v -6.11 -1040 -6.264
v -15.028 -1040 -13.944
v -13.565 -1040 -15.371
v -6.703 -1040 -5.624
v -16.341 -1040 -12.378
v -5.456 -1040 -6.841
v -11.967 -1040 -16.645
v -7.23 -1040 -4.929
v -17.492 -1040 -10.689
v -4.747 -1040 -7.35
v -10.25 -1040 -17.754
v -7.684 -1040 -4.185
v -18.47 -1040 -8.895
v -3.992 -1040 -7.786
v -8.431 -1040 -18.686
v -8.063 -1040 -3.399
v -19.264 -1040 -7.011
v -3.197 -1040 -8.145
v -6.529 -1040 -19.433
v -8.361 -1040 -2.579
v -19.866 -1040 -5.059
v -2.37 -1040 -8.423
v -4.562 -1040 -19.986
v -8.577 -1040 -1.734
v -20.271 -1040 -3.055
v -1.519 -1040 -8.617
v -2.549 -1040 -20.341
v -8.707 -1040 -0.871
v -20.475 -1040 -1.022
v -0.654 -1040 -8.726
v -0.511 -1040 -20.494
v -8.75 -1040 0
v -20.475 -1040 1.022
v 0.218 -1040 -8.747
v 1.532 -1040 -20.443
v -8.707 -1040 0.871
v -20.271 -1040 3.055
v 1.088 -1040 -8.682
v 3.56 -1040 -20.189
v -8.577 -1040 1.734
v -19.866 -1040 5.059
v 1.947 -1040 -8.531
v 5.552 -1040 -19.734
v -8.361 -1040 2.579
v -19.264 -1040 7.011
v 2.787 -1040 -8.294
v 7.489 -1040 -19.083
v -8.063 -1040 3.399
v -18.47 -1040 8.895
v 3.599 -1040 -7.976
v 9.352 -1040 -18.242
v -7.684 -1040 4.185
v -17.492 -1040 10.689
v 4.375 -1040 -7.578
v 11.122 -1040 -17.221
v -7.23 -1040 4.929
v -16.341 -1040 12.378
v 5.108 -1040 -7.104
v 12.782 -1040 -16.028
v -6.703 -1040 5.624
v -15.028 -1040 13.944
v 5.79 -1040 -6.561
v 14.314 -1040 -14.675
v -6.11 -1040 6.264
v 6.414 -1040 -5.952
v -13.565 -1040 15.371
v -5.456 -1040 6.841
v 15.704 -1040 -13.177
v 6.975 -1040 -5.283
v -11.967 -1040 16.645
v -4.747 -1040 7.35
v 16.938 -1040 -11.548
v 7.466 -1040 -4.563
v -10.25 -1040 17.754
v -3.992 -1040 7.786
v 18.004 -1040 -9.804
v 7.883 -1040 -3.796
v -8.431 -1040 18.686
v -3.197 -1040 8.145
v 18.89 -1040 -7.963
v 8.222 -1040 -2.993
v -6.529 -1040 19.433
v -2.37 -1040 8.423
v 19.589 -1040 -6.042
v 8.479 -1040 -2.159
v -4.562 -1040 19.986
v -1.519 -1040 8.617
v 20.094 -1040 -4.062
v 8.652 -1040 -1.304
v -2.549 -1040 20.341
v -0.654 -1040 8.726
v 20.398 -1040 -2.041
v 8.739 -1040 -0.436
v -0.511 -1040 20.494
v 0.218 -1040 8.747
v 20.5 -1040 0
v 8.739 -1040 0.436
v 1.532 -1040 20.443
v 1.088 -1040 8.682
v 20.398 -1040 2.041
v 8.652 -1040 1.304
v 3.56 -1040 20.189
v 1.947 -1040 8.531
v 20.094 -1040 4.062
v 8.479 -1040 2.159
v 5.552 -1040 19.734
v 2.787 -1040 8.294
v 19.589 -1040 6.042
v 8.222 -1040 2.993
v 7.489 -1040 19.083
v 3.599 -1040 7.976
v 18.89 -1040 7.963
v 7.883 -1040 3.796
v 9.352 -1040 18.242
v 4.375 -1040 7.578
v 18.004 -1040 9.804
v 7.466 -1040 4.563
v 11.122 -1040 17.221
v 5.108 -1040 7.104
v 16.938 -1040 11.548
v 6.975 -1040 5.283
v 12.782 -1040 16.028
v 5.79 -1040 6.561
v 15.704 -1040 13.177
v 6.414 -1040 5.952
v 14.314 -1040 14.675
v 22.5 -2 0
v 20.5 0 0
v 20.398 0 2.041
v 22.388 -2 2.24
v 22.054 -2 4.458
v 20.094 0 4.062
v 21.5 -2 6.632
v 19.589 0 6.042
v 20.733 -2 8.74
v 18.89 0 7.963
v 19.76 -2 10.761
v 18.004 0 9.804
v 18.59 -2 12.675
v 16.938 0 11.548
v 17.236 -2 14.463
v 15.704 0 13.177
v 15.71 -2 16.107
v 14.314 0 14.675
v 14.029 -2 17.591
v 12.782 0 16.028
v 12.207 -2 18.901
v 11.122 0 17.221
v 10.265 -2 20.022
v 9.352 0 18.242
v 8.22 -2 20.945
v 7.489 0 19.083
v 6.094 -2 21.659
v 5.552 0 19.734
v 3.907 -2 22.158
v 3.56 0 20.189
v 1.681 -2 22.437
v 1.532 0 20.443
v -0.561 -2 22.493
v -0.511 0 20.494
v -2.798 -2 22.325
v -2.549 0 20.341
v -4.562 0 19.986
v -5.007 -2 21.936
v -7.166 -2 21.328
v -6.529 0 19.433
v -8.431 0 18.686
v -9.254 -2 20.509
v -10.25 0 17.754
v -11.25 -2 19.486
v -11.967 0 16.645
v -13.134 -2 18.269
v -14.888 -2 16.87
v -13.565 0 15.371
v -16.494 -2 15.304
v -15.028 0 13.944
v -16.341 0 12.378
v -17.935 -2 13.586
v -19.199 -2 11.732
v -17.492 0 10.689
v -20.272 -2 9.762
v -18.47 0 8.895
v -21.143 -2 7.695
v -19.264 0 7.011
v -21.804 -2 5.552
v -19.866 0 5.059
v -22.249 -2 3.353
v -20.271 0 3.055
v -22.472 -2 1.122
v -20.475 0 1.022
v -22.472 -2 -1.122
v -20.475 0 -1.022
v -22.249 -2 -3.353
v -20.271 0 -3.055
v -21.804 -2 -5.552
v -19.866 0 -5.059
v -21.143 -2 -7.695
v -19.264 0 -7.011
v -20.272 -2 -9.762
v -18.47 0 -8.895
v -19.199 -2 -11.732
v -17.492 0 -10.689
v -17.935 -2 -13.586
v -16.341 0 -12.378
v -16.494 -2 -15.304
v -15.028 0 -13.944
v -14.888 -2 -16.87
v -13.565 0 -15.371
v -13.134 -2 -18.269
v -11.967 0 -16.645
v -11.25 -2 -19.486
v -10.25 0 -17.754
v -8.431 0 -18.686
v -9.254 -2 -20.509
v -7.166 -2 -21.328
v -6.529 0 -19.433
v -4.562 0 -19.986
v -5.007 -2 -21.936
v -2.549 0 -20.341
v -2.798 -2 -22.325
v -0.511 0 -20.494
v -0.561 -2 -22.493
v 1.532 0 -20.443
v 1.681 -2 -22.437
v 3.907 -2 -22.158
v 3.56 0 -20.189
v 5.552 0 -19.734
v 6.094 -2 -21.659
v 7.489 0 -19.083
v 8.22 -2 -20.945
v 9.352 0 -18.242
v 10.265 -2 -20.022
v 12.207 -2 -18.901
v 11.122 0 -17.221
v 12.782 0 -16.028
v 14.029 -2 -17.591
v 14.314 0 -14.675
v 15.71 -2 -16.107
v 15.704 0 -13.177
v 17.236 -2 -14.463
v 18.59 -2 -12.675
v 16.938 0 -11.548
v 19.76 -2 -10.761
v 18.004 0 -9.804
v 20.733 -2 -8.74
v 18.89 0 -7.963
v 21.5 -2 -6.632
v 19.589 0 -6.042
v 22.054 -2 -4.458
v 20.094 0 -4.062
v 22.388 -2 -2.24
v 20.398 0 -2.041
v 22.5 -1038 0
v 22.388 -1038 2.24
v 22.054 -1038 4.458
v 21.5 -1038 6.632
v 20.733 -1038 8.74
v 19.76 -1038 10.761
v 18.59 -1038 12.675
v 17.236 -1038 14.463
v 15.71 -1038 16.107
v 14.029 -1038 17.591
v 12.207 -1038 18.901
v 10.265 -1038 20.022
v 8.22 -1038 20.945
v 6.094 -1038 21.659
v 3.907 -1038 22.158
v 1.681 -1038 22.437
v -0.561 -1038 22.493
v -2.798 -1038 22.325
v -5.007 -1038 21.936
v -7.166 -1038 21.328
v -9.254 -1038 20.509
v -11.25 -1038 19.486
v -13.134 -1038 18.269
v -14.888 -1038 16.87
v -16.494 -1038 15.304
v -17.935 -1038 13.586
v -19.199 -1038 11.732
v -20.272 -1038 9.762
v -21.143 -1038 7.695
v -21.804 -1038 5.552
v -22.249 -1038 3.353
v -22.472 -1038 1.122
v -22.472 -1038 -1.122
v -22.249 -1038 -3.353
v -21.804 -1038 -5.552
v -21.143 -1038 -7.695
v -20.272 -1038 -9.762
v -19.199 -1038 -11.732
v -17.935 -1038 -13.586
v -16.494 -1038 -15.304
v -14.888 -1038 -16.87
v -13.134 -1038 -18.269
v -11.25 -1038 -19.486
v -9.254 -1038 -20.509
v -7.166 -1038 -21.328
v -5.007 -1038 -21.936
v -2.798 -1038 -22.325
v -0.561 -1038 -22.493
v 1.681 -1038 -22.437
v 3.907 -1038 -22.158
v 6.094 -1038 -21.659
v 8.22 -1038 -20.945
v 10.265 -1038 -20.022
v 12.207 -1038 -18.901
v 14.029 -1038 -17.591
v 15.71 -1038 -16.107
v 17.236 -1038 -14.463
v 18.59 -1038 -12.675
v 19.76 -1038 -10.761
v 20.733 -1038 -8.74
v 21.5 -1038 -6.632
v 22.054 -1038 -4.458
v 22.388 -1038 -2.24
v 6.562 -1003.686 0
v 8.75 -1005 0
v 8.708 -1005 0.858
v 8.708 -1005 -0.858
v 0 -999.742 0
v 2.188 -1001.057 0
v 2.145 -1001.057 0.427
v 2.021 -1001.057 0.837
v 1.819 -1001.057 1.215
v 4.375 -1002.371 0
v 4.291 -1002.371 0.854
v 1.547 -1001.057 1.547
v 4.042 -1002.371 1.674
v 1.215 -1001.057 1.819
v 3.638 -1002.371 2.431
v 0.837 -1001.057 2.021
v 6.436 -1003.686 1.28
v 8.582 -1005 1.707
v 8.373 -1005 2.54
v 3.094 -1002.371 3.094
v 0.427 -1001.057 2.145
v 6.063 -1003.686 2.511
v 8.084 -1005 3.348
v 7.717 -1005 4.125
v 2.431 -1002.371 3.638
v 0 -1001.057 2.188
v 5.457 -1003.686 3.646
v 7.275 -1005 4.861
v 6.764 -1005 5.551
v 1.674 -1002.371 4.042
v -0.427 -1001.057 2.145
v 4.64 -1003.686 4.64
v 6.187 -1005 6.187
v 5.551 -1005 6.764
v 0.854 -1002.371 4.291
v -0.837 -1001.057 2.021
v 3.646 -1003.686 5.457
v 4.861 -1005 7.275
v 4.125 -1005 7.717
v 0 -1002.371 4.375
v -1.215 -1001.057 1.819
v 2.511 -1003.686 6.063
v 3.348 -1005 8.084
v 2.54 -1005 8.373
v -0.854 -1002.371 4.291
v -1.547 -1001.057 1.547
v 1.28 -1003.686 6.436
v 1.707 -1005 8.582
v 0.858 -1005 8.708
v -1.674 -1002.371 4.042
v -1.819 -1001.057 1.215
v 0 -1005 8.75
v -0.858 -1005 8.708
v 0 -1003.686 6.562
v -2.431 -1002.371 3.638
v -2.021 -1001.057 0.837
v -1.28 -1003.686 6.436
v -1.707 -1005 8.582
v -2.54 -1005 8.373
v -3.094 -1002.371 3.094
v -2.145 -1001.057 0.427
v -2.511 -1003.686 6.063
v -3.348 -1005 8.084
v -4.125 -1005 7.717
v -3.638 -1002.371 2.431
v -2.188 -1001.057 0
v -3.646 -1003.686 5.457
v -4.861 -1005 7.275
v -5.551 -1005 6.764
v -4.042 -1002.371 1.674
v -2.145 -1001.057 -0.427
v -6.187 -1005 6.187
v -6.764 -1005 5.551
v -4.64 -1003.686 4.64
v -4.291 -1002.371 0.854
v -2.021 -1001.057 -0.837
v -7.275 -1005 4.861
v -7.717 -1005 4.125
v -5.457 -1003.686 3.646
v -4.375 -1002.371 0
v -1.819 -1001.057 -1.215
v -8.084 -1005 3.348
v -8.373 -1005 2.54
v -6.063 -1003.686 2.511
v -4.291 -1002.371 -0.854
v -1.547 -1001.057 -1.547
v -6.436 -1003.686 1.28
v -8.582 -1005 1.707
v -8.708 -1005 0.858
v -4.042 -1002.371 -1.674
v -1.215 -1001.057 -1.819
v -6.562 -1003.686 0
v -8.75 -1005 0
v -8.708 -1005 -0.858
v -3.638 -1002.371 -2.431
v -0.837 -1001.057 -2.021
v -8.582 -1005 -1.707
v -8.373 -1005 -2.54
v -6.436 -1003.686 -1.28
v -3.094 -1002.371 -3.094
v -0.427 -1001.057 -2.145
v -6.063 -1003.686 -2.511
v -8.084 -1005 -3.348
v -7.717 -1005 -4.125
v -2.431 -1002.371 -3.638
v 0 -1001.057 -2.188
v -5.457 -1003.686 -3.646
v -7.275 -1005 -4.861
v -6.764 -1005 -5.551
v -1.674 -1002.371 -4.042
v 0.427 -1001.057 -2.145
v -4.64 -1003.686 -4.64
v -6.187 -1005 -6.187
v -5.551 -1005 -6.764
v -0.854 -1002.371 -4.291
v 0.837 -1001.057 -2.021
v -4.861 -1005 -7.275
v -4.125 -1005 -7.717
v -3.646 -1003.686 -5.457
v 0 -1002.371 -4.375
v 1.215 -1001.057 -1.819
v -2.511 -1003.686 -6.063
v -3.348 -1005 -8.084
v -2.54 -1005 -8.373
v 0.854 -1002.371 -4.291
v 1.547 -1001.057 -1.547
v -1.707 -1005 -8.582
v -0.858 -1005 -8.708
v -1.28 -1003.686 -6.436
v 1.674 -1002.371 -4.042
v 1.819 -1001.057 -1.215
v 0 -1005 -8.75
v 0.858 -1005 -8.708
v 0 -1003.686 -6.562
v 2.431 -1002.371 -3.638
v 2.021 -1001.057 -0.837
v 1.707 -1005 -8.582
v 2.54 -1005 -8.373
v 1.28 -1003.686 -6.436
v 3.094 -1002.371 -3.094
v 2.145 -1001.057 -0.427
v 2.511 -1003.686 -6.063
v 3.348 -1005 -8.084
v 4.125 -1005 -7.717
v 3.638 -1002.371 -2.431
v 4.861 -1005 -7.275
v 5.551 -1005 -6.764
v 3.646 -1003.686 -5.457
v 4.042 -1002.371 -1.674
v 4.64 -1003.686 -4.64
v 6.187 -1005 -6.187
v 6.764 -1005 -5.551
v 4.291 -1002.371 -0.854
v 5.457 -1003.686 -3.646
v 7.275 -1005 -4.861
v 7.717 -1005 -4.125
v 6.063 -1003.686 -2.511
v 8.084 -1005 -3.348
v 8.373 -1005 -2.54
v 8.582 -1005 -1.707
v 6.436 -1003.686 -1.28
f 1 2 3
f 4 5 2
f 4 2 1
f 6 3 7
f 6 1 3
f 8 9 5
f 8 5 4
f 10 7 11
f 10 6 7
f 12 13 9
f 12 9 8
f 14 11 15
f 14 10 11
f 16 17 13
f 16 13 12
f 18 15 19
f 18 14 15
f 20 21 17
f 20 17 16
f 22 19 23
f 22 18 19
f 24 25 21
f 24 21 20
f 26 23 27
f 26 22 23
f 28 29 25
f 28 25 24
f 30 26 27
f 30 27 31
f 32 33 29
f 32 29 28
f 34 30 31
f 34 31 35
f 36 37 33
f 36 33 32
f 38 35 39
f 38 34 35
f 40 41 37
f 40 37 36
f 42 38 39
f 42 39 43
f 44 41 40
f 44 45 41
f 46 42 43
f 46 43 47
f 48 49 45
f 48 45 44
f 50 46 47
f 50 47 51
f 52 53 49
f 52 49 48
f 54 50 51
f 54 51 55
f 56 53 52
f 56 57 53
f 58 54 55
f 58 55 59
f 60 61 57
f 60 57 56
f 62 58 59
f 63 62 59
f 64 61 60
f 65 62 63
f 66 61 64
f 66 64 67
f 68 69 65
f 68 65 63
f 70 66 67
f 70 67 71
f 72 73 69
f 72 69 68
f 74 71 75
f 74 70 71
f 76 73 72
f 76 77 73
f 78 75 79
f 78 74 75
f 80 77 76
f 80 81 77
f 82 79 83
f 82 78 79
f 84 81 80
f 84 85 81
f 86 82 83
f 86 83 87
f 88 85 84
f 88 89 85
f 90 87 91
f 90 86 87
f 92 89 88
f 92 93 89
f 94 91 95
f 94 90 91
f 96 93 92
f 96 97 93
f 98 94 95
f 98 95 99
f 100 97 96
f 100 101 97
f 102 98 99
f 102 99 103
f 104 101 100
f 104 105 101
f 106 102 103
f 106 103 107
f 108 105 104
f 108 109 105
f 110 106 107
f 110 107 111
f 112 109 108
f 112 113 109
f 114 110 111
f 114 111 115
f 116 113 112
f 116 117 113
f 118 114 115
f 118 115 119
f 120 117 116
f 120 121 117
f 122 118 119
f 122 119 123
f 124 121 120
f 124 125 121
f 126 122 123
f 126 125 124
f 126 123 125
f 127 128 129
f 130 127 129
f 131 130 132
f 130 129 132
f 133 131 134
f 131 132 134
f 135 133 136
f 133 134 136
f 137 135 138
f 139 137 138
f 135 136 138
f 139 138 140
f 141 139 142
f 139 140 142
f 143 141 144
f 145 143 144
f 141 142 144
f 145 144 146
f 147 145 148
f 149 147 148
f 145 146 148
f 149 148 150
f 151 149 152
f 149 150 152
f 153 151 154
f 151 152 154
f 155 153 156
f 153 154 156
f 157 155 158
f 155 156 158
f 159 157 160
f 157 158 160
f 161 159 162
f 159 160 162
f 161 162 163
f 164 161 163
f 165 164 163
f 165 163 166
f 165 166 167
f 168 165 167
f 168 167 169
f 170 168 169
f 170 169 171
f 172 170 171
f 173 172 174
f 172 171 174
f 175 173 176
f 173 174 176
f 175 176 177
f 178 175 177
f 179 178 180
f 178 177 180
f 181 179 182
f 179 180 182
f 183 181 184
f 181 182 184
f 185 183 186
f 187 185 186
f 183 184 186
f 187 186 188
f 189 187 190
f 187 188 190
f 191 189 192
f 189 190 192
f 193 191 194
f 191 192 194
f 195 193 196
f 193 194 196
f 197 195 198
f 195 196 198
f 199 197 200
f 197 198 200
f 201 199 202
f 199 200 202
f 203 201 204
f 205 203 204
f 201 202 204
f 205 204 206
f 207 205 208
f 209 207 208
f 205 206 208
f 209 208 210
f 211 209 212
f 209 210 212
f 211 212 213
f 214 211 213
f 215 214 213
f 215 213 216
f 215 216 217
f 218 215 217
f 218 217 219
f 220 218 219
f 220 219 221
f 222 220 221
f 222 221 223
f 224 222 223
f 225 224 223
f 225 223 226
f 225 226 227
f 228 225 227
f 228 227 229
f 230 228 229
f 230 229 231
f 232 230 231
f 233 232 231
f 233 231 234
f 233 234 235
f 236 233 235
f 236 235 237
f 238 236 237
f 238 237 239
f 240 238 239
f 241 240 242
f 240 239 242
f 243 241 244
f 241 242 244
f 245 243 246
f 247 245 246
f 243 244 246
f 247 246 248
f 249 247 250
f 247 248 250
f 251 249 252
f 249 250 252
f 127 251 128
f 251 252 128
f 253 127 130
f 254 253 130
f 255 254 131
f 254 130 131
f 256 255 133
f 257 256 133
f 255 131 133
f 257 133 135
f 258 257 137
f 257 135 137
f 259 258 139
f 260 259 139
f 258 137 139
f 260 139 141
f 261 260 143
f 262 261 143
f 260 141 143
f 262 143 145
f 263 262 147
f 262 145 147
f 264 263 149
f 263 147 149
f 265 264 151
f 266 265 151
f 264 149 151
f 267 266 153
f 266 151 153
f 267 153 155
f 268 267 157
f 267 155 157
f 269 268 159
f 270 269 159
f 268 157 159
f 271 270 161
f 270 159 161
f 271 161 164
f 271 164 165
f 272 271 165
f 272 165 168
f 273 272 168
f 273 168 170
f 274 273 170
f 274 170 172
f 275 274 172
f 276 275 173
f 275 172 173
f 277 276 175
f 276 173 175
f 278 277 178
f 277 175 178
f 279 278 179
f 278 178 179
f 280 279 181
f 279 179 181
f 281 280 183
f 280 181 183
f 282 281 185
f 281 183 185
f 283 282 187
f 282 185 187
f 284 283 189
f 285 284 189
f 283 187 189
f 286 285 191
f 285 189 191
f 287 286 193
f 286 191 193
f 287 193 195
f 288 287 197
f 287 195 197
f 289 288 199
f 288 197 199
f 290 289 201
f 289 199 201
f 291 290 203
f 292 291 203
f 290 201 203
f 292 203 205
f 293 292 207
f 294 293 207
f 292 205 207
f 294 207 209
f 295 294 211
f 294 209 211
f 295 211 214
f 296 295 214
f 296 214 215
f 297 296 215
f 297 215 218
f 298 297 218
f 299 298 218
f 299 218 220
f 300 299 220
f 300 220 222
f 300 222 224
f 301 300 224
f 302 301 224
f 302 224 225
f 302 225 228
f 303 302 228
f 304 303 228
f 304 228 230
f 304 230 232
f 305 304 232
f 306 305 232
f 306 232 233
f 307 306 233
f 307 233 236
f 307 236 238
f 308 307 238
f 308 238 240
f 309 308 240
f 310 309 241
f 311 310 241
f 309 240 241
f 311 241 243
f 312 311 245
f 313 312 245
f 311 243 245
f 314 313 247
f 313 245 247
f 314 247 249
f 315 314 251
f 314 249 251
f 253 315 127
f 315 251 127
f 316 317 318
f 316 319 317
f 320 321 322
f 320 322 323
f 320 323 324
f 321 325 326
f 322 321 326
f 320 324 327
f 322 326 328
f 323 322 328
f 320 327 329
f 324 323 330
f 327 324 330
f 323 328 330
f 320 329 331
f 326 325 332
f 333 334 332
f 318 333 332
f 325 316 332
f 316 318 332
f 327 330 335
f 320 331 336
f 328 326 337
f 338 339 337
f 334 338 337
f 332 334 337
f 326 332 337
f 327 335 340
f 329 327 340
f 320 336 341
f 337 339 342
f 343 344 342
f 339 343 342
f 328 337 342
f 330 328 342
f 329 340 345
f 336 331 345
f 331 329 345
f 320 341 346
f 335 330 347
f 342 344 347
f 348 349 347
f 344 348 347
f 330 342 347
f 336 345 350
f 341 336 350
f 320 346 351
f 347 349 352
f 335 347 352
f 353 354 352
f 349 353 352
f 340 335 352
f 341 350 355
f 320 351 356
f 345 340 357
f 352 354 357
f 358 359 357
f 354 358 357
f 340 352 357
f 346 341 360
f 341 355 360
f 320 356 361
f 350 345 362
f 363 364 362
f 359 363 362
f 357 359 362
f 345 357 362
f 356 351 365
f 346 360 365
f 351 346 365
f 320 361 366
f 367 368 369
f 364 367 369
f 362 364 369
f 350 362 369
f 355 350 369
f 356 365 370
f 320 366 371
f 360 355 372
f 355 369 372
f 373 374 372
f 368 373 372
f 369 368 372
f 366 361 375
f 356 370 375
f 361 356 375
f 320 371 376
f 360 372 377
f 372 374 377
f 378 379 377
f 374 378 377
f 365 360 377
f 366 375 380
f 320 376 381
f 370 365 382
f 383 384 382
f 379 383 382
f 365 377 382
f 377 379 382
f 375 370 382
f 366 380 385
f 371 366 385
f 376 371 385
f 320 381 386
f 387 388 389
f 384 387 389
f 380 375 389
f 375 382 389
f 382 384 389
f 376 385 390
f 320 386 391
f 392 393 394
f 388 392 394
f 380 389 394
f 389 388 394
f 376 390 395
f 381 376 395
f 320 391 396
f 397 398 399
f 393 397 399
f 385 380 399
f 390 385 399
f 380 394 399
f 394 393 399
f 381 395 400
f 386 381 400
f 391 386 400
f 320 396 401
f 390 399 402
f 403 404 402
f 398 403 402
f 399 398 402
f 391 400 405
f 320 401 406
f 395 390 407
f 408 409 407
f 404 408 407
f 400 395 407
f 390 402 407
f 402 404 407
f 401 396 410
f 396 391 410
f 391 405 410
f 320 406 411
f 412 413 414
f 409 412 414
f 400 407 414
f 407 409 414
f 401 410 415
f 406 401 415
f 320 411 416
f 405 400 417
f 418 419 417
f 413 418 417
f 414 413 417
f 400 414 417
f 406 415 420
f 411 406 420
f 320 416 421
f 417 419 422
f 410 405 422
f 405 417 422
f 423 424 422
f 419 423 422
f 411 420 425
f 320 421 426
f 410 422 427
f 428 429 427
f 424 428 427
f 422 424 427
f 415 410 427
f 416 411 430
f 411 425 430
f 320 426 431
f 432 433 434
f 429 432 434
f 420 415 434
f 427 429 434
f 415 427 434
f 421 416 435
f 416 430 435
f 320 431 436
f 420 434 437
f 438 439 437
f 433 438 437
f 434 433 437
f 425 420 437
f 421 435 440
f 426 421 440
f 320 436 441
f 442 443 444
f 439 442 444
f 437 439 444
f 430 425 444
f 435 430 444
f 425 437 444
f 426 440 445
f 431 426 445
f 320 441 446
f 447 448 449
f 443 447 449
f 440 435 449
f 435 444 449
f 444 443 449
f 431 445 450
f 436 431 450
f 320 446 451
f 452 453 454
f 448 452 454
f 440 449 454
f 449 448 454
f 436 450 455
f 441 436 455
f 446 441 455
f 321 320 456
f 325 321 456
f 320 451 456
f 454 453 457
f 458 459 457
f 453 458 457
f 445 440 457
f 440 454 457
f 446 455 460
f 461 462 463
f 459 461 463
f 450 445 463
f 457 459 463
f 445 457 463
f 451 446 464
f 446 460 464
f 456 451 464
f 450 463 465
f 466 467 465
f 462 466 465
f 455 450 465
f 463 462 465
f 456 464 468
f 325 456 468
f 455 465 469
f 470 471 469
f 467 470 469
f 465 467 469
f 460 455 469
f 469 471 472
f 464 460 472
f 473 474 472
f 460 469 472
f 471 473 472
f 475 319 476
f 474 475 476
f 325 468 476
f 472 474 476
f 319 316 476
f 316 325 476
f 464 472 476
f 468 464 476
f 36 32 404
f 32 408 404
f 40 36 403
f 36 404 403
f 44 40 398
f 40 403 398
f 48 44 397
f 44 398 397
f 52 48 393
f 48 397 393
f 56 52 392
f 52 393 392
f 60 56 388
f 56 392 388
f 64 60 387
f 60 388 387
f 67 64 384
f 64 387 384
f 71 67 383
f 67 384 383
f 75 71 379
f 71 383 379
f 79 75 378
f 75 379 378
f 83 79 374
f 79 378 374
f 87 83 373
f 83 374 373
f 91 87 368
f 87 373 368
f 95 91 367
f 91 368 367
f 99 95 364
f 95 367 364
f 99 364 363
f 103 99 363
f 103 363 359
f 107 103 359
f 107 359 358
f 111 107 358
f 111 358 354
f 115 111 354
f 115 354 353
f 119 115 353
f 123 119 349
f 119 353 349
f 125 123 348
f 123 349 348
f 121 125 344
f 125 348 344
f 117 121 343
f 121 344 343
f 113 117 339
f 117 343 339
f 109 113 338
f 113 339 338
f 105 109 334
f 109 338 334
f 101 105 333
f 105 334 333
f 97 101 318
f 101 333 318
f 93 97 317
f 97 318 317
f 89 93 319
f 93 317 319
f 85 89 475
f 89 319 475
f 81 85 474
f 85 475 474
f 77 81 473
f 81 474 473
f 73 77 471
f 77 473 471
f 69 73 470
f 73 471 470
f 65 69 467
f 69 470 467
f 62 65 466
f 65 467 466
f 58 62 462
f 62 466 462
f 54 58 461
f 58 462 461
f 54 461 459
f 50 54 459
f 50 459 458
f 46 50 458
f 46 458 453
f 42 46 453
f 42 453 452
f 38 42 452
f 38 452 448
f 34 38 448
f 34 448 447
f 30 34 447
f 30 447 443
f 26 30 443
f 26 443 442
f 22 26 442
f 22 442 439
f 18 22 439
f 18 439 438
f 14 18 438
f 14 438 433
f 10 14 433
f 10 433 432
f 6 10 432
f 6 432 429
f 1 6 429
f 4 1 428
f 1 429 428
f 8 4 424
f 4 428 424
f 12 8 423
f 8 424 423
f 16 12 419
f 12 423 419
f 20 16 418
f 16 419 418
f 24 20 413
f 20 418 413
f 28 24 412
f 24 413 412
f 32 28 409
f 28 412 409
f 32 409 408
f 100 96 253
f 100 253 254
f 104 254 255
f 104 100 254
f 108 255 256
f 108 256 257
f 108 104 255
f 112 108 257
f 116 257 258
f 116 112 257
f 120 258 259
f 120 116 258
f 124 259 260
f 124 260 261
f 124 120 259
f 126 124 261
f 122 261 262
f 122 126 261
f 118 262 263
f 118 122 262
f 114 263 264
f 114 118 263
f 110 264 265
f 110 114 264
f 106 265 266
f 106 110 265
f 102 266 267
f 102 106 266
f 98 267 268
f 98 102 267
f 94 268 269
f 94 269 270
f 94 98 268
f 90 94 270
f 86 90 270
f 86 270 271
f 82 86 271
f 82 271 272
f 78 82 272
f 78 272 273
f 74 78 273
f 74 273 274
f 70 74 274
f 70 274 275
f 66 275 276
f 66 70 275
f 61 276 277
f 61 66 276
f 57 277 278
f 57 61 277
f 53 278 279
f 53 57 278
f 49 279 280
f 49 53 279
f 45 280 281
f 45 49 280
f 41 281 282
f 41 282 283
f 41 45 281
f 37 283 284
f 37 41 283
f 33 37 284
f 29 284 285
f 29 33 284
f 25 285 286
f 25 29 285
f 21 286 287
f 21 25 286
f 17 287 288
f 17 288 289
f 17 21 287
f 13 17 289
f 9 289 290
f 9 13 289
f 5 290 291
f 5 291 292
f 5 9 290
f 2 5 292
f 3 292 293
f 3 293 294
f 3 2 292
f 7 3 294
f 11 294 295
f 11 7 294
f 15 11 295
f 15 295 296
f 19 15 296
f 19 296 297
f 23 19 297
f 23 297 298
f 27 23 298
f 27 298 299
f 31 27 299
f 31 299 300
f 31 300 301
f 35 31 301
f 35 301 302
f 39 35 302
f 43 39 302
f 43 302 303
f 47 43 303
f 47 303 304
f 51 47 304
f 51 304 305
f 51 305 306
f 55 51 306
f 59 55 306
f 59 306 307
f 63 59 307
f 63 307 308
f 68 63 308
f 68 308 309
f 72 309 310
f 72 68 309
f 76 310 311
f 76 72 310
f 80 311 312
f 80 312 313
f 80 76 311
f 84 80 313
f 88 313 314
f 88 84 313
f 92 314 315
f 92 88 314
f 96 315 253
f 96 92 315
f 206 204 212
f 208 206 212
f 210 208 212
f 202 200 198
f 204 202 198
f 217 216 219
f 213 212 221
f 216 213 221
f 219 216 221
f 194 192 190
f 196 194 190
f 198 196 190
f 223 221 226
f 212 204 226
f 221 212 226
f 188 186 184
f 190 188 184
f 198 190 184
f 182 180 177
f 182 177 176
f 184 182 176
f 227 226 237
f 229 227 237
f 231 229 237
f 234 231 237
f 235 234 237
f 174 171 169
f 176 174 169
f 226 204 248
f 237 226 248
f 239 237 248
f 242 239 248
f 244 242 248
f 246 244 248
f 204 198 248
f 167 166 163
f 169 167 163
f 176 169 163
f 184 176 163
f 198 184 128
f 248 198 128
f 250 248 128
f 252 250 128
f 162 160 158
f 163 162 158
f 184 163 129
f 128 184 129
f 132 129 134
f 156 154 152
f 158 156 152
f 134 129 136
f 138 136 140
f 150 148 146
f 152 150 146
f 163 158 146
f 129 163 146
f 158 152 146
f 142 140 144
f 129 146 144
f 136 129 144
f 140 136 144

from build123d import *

# Parameters (mm, degrees)
F0_R     = 22.5
F1_DEPTH = 1040
F2_SIZE  = 2
F4_D     = 17.5
F4_DEPTH = 35
F4_TIP   = 5.2575304165


with BuildPart() as f1:
    # F0 (on Front) → F1 (new body)
    with BuildSketch(Plane.XZ):
        Circle(F0_R)
    extrude(amount=F1_DEPTH)

    # F2
    f2_edges = [f1.edges().sort_by_distance(p)[0] for p in [
        (-22.5, 0, 0),
        (-22.5, -1040, 0),
    ]]
    chamfer(f2_edges, length=F2_SIZE)

    # F4
    with Locations(Plane.XZ.offset(1040)):
        with Locations((0, 0)):
            Hole(F4_D / 2, depth=F4_DEPTH)
            with Locations((0, 0, -(F4_DEPTH + F4_TIP / 2))):  # 118° drill point
                Cone(0, F4_D / 2, F4_TIP, mode=Mode.SUBTRACT)


solid = f1.part
